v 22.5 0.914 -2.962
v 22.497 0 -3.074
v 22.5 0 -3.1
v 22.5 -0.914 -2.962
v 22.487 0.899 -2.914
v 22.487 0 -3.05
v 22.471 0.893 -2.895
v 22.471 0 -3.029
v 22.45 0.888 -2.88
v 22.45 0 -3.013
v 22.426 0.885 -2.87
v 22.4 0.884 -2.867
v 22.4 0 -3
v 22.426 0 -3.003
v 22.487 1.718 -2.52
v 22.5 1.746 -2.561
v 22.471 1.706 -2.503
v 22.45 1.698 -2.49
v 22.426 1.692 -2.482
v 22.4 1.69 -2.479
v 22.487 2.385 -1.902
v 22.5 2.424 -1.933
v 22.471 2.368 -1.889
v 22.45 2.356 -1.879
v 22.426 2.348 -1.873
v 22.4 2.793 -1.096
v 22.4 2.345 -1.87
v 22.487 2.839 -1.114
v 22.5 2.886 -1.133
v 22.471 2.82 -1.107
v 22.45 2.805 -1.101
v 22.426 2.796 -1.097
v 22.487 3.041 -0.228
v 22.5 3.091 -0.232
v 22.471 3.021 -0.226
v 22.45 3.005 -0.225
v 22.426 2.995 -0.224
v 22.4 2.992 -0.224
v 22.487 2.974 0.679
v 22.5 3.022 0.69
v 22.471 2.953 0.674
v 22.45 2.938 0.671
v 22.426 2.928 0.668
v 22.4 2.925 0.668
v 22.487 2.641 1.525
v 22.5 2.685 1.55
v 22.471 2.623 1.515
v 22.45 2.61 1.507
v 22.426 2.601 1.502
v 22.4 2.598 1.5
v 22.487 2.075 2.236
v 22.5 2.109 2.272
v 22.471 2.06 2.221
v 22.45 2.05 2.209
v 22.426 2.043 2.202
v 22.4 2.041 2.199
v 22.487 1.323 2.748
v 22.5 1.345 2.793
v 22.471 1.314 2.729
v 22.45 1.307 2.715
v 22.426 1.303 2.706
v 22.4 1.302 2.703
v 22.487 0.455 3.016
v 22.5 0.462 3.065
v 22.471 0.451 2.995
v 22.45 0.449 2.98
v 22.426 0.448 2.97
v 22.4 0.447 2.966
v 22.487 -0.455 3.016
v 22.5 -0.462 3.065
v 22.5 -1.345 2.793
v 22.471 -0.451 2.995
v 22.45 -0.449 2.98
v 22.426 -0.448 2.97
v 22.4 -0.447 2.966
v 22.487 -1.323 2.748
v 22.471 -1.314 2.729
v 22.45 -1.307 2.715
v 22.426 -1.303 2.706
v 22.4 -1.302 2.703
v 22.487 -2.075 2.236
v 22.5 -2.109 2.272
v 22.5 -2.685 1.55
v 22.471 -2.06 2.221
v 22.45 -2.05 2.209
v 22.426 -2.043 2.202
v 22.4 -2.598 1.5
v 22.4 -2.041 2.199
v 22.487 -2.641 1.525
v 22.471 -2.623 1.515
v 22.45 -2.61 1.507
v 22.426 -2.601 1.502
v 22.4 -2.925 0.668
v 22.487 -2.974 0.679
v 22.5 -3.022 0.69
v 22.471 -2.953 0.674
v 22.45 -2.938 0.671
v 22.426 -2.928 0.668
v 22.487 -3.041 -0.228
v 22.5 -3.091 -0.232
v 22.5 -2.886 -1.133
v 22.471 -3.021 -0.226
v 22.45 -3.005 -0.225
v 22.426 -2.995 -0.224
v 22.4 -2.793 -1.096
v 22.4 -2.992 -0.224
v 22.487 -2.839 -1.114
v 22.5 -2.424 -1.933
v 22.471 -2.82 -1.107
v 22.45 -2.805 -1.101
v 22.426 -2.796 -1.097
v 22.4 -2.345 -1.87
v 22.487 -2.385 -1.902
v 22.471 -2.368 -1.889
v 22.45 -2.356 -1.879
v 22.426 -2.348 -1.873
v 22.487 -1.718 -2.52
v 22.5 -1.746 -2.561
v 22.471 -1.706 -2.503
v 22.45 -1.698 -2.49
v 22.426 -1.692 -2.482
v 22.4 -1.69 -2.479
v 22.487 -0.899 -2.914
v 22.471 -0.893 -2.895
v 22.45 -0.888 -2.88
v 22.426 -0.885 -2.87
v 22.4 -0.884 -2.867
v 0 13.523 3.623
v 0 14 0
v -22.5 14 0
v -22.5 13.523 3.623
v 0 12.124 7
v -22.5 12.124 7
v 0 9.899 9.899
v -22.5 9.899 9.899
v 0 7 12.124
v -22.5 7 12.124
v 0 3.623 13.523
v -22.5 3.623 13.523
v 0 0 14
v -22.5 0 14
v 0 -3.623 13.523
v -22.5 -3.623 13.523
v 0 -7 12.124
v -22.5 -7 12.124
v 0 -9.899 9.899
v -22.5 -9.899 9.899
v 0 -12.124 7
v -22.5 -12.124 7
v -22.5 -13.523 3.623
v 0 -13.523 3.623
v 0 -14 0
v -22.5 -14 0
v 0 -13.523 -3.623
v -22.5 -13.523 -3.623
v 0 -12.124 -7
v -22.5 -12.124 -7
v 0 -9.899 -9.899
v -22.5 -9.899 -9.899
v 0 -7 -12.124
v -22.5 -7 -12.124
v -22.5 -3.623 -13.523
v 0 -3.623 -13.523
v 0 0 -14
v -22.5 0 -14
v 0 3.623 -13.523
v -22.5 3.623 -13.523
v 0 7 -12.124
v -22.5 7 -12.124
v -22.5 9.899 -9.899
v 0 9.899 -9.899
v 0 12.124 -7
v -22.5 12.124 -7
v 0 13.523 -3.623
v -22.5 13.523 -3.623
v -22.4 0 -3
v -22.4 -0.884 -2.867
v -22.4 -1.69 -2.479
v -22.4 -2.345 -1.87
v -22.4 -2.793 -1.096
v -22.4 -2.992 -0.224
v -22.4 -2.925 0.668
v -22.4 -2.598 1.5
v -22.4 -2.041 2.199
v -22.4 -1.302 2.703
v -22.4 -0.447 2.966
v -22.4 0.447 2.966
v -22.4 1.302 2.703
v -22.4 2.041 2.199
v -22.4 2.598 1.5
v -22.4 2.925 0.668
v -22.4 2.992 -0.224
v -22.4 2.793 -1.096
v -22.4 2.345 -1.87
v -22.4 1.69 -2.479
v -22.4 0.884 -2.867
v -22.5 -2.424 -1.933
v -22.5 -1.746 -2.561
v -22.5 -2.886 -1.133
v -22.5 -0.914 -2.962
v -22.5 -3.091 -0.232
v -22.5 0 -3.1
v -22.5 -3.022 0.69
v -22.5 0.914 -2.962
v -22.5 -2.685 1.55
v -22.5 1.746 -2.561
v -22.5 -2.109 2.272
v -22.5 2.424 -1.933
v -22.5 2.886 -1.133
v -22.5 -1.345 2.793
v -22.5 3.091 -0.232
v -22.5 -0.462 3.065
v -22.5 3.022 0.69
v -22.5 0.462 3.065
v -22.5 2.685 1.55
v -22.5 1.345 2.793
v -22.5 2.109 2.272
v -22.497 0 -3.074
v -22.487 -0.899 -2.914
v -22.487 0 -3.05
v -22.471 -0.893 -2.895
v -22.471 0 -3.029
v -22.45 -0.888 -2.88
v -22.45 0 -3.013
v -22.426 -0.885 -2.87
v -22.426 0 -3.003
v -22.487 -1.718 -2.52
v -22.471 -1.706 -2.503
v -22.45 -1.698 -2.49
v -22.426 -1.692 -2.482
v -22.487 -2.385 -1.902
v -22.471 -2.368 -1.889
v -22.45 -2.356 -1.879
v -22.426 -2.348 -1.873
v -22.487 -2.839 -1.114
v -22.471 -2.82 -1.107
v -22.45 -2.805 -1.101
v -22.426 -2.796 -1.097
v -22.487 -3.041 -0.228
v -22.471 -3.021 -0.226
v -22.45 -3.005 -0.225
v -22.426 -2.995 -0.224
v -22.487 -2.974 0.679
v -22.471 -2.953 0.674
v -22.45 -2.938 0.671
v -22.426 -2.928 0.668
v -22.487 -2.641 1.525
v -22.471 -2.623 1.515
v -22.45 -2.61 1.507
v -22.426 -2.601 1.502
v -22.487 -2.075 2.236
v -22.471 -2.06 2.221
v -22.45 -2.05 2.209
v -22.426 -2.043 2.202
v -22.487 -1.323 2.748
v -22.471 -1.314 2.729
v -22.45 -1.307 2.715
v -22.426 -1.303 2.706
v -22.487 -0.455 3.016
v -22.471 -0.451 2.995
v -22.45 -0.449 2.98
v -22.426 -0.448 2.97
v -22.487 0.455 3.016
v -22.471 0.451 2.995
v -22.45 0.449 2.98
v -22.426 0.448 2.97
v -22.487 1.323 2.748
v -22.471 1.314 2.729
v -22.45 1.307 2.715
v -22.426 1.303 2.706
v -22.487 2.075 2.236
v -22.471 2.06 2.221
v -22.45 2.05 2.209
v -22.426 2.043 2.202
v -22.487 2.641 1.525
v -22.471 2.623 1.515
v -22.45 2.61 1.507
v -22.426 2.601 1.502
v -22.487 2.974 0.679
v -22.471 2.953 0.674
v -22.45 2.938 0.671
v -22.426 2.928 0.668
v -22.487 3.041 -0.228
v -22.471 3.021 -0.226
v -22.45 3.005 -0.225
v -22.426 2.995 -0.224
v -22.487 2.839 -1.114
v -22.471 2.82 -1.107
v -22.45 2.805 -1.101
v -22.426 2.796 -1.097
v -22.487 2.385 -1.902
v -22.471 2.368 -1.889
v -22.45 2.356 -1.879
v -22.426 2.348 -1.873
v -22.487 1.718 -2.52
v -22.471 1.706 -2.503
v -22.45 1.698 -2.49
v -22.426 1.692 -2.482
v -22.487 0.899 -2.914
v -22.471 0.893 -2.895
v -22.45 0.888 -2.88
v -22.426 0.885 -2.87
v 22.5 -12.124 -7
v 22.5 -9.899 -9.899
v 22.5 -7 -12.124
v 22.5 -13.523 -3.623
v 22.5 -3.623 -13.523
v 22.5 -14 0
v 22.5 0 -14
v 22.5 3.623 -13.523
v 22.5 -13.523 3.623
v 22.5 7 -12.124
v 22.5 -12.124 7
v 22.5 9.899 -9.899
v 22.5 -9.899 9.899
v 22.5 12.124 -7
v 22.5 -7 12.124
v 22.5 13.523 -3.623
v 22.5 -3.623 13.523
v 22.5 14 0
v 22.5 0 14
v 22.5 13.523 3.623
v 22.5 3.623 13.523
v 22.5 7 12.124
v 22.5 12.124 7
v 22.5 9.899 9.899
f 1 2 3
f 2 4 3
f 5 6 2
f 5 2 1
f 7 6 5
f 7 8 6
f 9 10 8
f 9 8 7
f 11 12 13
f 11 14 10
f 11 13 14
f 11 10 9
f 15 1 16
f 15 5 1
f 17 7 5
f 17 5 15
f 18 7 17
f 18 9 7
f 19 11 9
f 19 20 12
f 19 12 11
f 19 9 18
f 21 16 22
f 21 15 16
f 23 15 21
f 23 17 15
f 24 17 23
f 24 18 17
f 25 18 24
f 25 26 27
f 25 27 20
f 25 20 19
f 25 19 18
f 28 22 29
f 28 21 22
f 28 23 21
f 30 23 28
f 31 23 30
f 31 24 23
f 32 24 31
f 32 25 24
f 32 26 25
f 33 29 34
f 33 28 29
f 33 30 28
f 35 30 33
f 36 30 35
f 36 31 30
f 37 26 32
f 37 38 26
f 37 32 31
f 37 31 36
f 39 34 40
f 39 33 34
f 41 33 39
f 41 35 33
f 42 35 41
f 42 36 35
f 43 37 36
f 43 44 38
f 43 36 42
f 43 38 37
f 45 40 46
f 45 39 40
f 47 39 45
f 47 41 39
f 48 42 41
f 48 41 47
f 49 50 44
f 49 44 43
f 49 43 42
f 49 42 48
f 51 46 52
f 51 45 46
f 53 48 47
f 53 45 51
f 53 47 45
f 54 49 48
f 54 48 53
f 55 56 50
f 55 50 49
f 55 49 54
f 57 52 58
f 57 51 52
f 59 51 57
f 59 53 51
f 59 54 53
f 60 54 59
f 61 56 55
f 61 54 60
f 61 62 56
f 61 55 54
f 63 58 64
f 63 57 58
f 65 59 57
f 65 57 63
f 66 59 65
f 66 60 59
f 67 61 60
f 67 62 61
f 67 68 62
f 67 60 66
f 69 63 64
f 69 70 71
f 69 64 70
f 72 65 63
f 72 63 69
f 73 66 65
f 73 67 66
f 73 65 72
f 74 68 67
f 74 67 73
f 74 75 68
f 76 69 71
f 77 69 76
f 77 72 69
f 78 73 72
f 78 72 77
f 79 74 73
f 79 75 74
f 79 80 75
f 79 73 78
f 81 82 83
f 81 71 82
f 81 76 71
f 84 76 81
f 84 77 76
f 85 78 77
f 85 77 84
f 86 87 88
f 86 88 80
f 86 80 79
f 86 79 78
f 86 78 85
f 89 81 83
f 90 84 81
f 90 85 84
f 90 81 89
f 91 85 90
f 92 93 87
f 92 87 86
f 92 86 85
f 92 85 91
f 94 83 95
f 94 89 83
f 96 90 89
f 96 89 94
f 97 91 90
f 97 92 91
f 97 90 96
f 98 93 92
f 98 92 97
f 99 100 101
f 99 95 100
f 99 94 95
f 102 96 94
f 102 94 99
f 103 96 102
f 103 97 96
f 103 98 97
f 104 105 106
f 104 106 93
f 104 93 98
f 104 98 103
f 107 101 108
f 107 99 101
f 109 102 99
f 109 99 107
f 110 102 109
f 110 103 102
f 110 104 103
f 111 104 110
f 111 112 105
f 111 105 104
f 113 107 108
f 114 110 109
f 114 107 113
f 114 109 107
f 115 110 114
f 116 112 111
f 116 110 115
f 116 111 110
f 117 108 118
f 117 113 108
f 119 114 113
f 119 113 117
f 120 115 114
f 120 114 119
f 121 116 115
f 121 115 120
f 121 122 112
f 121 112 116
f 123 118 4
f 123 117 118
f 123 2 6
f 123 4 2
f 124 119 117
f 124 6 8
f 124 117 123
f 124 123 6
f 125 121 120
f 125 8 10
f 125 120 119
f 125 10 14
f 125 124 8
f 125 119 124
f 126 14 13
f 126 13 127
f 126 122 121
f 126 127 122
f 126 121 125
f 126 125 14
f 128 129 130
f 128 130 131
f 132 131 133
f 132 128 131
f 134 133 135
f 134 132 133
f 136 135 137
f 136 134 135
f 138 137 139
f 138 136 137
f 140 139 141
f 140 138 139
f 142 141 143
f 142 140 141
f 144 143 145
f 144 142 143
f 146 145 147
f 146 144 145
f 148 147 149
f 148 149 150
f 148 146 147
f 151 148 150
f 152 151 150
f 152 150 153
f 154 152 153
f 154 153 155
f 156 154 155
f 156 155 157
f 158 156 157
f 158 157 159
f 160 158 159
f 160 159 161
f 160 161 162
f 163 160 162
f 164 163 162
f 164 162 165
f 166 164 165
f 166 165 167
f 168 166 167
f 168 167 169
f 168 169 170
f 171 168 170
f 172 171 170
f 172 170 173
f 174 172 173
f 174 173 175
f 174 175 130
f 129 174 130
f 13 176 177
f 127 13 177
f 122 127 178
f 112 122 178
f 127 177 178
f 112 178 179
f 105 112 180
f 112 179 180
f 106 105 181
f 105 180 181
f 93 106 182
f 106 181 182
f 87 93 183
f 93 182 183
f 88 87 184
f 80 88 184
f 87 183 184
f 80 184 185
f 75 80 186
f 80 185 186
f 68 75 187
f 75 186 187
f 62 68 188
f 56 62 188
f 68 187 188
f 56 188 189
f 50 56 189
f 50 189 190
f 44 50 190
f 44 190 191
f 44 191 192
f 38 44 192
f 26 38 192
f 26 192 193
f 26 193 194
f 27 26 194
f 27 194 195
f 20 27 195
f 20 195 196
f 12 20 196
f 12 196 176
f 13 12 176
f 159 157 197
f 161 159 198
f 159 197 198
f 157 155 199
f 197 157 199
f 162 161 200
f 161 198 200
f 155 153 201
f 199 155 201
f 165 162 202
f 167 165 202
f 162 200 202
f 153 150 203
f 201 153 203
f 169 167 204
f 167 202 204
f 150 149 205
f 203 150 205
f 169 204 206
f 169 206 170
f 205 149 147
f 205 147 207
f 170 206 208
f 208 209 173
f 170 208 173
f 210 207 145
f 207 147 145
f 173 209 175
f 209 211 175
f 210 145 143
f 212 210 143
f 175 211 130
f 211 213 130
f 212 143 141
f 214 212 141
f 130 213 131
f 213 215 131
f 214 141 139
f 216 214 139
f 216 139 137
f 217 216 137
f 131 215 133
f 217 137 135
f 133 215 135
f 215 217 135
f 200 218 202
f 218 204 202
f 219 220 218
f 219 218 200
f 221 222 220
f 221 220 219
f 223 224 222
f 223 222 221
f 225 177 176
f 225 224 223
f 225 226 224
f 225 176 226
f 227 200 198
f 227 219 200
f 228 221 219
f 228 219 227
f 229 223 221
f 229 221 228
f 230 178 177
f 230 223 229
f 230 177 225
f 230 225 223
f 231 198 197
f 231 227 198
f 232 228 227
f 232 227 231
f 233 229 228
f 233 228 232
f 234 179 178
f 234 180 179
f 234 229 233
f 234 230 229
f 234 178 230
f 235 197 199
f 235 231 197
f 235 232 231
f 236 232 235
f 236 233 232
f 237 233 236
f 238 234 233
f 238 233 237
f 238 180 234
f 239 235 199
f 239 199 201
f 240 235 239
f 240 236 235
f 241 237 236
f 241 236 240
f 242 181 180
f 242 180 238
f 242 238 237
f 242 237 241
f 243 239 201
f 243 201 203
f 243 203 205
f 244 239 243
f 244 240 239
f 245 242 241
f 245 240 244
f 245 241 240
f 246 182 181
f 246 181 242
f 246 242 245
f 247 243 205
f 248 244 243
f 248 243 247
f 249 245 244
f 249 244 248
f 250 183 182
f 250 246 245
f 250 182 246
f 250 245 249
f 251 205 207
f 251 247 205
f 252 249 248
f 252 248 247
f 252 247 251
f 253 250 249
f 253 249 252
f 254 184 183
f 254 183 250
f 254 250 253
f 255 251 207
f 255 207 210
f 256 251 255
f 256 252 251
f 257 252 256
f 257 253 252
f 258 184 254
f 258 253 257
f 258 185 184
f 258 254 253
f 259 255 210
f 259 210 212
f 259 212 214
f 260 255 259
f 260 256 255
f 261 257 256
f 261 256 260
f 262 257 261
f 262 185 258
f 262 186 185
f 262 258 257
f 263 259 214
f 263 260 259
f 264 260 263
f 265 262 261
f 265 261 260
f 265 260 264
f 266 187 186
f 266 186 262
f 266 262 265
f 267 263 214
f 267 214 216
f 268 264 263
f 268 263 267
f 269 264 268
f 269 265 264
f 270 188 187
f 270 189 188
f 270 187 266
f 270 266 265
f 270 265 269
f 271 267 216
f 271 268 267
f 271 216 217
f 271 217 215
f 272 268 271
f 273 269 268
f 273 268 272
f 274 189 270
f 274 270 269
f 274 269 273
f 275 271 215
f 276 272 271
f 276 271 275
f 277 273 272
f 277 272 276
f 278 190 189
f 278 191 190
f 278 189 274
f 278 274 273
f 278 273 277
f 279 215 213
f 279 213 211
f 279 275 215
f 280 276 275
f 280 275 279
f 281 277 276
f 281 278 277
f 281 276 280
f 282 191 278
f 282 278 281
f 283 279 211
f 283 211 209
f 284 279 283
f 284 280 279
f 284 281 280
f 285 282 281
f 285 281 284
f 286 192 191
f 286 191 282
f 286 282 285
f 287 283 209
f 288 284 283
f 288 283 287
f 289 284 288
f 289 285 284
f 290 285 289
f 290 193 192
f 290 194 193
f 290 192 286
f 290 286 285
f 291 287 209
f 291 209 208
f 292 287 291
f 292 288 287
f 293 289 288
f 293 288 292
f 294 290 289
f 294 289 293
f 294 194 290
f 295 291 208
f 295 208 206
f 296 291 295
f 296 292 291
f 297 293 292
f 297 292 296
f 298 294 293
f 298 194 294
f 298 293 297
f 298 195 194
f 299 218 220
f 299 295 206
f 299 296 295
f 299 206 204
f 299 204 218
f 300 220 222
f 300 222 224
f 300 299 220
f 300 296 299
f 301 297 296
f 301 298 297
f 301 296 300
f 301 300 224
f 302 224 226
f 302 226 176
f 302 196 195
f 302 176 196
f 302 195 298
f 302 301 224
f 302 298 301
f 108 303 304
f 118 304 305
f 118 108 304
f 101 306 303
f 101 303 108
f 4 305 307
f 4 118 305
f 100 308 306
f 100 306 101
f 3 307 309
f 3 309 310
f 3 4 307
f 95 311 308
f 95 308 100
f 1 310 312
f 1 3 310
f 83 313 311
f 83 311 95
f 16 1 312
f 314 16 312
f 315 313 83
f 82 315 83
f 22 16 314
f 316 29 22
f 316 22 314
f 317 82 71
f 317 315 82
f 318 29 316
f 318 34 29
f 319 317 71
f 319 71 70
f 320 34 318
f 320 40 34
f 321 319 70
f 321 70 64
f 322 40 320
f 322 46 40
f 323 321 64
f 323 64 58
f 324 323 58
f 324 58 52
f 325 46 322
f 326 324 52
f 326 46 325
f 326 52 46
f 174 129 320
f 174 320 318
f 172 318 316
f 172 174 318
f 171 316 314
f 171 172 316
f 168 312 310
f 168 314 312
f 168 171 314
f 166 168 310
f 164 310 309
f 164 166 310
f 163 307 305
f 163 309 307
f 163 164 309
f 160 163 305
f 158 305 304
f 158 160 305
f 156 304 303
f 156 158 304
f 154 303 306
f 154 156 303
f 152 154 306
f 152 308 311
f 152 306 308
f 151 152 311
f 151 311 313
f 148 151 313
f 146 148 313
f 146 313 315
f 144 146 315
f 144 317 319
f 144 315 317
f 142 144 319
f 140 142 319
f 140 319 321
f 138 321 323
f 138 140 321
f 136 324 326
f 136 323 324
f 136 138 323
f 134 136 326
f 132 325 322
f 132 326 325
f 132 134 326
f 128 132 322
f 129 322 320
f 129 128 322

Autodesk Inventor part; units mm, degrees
ref_plane "YZ Plane" through (0, 0, 0) normal (1, 0, 0) x (0, 1, 0)
ref_plane "XZ Plane" through (0, 0, 0) normal (0, 1, 0) x (-1, 0, 0)
ref_plane "XY Plane" through (0, 0, 0) normal (0, 0, 1) x (1, 0, 0)
sketch "Эскиз1" plane through (0, 0, 0) normal (1, 0, 0) x (0, 1, 0)
  circle A0 centre (0, 0) radius 14
  dimension "d0" = 28
extrude "Выдавливание1" add sketch "Эскиз1" along normal mid plane 45
sketch "Эскиз2" plane through (22.5, 0, 0) normal (1, 0, 0) x (0, 0, -1)
  point P0 (0, 0)
  point P1 (0, 0)
hole "Отверстие1" at (22.5, 0, 0) direction (-1, 0, 0) diameter 6 depth 60
fillet "Сопряжение1" radius 0.1 2 edges at (-22.5, 0, 3) (22.5, 0, 3)
properties part number "Вал конвейера 2"
